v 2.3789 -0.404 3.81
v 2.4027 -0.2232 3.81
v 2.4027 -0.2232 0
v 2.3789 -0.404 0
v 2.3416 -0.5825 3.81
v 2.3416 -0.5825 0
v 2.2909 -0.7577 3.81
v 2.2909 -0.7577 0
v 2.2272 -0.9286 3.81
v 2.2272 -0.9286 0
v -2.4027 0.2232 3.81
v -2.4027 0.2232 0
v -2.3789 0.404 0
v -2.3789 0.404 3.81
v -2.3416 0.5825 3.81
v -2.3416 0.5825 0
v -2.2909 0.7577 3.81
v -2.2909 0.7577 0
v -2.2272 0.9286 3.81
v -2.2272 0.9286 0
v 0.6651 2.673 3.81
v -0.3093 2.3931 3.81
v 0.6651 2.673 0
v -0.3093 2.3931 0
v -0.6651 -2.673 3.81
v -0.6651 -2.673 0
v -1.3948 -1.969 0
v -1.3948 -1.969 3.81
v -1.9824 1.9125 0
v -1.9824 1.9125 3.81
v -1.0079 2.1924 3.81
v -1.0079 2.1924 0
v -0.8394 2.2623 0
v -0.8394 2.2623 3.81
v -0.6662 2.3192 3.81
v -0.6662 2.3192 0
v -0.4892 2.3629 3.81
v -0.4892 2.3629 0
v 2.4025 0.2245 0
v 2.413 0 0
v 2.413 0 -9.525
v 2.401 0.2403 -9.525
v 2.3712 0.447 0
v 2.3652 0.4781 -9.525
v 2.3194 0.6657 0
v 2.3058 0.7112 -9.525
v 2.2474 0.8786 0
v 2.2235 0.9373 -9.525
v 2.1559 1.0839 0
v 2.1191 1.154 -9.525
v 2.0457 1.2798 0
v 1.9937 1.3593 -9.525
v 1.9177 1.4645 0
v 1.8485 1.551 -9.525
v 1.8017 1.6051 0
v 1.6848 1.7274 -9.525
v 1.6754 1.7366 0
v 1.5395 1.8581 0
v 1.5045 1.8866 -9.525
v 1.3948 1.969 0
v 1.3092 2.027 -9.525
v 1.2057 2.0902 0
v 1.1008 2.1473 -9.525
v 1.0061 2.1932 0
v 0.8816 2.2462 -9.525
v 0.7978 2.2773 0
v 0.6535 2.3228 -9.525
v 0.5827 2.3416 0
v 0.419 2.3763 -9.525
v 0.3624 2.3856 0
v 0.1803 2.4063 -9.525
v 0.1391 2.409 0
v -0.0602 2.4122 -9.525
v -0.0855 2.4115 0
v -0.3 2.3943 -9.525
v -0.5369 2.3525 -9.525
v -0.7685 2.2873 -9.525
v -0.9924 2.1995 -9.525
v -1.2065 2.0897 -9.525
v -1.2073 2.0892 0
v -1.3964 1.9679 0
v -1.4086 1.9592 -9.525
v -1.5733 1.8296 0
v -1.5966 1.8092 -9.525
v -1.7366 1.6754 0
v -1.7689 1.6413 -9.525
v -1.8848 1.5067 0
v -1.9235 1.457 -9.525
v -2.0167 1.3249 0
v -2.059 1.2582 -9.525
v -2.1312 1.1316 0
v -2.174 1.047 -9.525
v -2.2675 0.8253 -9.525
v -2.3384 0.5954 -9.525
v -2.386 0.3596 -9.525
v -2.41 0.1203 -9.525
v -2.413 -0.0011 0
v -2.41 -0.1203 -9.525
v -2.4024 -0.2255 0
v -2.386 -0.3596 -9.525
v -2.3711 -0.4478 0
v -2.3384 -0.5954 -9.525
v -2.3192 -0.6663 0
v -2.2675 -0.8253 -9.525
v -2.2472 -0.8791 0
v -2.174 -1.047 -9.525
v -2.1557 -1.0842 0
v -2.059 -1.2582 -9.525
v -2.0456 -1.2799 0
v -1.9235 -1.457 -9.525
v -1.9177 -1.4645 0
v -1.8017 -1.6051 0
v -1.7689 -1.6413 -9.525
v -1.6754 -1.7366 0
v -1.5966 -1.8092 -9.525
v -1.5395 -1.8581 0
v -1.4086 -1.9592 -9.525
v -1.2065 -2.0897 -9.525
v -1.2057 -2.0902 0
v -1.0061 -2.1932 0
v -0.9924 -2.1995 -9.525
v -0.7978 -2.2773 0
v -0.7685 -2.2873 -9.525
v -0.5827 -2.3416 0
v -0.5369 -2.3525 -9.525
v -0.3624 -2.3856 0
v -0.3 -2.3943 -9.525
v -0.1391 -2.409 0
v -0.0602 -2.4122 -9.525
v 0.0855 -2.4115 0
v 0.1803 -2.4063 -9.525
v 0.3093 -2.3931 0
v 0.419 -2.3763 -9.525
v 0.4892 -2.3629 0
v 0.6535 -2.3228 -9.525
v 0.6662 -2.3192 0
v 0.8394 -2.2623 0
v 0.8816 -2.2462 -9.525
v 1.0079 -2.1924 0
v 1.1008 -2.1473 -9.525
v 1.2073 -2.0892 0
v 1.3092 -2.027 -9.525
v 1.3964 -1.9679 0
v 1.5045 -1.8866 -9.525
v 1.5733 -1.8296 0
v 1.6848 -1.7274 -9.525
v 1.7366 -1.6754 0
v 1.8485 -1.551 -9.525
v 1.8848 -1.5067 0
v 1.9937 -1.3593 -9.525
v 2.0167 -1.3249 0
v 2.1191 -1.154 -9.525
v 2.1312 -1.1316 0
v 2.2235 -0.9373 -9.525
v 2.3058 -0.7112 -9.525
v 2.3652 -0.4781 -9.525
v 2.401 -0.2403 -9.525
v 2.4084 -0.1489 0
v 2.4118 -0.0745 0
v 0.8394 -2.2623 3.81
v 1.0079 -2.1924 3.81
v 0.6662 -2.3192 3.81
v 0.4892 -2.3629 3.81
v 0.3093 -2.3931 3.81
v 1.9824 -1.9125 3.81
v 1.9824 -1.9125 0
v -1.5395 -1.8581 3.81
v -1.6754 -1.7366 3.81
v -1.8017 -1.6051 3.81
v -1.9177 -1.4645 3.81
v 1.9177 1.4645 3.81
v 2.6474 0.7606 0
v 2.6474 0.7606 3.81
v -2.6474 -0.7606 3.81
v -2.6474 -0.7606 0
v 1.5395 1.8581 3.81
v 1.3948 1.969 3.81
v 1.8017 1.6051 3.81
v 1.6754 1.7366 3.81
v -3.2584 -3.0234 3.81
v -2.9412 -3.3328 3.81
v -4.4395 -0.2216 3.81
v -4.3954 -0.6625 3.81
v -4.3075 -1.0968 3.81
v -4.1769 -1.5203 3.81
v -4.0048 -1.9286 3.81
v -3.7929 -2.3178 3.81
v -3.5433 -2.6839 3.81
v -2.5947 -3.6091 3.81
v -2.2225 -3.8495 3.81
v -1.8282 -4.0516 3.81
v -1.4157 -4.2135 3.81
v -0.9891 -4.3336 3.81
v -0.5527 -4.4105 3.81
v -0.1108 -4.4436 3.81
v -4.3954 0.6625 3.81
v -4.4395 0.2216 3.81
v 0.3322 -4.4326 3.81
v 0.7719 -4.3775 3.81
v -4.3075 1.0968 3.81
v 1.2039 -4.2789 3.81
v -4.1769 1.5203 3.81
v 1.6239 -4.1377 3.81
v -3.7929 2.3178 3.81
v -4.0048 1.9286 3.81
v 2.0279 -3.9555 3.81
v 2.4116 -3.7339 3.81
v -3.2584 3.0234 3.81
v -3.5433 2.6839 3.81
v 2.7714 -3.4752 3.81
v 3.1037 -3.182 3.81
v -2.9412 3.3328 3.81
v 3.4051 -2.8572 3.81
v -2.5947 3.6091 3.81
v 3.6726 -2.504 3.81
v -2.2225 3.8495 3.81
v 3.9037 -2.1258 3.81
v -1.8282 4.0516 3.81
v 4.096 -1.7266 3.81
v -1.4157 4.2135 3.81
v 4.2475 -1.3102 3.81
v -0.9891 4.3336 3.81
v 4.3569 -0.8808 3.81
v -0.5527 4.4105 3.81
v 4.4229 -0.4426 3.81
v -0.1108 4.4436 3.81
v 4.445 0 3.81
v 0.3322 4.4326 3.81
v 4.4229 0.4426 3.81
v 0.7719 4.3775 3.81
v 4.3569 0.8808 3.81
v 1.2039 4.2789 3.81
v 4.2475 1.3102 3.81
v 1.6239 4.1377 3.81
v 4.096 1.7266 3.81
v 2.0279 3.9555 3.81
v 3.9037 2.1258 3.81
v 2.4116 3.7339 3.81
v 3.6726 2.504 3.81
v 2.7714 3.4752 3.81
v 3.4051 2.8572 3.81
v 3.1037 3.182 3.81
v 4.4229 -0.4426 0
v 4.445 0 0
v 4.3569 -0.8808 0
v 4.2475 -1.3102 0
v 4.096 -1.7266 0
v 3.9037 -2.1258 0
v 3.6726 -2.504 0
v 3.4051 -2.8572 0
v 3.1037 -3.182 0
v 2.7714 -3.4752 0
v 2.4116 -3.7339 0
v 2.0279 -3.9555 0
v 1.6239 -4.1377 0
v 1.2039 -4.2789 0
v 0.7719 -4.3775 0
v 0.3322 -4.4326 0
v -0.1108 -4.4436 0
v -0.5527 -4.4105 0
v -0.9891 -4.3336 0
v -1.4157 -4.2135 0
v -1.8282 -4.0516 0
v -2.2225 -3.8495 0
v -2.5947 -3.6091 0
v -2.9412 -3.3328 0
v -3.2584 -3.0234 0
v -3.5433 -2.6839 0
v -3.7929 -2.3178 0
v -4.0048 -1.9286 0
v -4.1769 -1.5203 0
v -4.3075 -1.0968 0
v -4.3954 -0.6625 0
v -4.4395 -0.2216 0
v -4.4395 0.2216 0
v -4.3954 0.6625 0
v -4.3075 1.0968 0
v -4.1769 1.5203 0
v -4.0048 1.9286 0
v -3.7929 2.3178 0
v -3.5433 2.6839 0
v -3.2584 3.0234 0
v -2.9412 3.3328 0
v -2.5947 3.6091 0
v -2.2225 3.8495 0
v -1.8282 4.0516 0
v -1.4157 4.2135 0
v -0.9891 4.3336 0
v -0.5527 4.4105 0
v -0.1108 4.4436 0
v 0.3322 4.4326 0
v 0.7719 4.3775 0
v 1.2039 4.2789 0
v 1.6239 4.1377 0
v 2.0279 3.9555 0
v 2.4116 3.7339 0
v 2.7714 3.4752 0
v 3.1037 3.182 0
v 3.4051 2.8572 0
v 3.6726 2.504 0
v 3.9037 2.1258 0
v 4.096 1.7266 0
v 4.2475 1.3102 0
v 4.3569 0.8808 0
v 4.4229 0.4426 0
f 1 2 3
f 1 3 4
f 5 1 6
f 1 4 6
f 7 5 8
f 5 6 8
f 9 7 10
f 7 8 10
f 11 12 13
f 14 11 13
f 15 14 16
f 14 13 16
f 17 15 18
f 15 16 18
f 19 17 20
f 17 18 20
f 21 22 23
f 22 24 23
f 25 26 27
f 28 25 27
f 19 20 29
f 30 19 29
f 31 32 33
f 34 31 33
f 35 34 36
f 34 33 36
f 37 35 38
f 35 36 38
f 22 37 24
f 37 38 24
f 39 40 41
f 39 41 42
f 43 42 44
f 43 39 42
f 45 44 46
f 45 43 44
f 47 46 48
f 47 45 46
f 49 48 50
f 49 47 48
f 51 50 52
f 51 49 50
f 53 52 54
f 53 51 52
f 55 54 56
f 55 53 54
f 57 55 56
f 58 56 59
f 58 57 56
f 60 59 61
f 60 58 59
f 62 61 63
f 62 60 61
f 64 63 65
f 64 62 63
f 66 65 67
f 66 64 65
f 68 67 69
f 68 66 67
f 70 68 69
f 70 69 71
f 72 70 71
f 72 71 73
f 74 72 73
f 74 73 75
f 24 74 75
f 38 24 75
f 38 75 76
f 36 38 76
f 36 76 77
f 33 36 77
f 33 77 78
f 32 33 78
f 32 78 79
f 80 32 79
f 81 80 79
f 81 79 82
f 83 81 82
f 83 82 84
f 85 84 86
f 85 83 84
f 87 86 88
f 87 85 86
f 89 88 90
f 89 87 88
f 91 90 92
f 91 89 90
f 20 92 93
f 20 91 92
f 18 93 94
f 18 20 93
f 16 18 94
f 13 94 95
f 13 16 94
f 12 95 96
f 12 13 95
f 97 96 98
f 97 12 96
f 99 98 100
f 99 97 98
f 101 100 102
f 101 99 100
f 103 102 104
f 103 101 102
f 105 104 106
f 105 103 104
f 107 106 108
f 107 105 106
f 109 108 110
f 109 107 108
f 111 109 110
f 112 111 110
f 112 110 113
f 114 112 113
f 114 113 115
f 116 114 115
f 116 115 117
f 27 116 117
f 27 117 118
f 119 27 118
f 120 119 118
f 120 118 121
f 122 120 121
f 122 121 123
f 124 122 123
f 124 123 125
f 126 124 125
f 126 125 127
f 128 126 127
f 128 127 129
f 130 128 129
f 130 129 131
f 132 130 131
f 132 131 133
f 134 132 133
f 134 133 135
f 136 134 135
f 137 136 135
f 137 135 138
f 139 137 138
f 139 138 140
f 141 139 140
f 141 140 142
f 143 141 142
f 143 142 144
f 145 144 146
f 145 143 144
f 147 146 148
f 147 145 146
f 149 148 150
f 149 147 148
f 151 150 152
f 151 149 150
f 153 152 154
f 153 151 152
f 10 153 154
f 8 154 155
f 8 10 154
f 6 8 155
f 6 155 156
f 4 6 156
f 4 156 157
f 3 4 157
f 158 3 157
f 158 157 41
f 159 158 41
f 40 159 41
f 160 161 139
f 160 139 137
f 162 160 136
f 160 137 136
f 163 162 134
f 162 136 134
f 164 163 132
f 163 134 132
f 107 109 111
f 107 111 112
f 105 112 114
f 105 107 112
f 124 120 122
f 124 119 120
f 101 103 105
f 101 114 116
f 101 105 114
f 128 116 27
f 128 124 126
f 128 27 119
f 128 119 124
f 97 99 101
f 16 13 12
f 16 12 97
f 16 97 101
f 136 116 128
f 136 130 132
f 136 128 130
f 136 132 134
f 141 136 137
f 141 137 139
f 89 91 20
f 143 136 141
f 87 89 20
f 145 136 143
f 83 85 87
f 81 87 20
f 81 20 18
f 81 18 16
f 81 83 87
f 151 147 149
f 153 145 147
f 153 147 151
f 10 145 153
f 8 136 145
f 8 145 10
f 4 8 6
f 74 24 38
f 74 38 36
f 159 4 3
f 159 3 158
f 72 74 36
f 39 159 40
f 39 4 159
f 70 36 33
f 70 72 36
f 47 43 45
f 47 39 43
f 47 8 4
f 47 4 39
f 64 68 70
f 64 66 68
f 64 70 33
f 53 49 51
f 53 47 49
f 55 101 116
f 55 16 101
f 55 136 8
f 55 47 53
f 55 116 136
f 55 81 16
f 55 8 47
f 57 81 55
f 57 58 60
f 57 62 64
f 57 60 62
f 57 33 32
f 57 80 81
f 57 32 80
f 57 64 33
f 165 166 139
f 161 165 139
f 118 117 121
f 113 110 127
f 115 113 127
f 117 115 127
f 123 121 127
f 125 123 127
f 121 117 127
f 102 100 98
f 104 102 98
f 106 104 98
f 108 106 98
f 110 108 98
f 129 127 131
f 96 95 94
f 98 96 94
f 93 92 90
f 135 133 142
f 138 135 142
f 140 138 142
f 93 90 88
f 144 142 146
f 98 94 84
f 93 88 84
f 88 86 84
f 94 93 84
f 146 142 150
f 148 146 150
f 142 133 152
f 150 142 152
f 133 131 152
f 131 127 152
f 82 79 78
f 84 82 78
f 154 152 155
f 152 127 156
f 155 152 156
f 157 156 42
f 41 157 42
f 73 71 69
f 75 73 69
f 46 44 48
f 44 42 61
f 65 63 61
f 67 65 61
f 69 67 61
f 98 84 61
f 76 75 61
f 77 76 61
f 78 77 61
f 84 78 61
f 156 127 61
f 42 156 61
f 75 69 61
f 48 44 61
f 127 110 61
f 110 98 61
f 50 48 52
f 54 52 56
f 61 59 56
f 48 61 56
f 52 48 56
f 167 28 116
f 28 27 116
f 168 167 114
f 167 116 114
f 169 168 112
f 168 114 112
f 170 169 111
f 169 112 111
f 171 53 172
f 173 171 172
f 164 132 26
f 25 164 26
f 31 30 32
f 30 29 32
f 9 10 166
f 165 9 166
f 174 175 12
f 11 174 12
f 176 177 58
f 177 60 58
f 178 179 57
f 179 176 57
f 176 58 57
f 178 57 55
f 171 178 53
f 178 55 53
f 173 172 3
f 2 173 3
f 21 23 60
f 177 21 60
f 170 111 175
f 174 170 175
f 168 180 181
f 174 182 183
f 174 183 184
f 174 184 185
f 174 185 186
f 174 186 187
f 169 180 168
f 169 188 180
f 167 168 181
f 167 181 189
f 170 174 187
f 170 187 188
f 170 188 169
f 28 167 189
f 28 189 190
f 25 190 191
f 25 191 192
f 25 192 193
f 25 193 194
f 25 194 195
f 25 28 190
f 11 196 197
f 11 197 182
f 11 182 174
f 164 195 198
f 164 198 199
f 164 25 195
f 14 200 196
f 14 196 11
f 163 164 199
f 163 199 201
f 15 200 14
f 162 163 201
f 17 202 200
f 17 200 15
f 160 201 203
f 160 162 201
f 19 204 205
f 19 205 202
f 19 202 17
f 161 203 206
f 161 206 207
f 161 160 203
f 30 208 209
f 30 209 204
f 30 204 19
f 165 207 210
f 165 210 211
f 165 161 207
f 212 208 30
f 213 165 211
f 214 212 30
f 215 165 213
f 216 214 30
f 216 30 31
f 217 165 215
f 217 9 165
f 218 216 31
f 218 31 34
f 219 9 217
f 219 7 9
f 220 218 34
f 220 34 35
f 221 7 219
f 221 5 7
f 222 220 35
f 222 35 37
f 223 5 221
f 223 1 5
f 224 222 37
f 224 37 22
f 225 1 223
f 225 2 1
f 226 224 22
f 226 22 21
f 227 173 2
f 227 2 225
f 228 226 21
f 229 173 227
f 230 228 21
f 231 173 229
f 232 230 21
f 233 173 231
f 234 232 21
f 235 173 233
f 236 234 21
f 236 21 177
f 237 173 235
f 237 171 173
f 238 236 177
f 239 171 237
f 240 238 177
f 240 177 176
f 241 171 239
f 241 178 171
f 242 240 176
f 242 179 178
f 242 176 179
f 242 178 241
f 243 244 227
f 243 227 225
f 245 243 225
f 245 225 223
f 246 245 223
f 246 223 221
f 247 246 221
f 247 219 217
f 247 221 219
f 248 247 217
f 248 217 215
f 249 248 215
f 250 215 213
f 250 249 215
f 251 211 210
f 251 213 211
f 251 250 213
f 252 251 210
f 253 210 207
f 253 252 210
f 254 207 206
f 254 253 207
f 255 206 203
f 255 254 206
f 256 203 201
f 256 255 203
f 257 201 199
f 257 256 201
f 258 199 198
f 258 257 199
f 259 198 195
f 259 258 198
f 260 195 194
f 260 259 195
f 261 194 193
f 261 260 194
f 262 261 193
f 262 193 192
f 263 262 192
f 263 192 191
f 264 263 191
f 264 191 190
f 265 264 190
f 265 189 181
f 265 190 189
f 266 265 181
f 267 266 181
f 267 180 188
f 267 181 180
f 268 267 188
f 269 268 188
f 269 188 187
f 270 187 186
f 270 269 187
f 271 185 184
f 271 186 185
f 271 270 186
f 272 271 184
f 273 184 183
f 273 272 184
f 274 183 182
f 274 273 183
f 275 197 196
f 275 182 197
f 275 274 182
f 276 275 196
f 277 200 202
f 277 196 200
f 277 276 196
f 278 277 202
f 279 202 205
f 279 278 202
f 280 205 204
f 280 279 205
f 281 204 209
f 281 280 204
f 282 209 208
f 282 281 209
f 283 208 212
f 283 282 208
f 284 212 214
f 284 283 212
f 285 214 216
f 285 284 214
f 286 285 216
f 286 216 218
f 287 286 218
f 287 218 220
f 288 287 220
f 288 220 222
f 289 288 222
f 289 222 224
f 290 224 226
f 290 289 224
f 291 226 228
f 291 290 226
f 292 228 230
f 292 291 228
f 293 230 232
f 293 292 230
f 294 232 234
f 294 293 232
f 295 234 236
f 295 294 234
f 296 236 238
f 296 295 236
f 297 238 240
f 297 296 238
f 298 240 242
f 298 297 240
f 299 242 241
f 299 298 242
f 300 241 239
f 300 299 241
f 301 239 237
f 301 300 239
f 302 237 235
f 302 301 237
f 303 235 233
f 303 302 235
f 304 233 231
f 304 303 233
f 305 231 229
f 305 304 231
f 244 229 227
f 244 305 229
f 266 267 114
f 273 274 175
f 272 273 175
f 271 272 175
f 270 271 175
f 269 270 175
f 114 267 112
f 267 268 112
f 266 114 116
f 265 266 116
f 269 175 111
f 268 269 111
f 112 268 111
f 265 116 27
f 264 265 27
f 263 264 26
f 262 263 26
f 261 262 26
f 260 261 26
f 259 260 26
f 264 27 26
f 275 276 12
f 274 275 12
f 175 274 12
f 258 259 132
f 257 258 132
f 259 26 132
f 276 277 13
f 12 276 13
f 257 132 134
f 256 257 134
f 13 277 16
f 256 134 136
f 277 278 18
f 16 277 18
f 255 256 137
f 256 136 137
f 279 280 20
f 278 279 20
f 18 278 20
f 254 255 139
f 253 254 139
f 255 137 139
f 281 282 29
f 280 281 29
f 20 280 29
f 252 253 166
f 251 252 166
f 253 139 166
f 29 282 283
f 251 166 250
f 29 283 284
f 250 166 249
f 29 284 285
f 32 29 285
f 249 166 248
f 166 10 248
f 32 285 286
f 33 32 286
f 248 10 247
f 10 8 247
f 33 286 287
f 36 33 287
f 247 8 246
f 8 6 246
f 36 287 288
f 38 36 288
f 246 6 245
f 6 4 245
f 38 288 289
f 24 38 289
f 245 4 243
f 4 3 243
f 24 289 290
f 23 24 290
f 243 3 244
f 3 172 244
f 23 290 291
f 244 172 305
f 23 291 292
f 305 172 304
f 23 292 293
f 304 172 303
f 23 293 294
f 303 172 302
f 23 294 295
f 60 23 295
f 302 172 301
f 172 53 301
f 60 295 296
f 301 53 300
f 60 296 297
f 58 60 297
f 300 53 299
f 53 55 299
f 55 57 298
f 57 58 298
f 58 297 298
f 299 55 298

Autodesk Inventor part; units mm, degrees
ref_plane "YZ Plane" through (0, 0, 0) normal (1, 0, 0) x (0, 1, 0)
ref_plane "XZ Plane" through (0, 0, 0) normal (0, 1, 0) x (-1, 0, 0)
ref_plane "XY Plane" through (0, 0, 0) normal (0, 0, 1) x (1, 0, 0)
sketch "Sketch1" plane through (0, 0, 0) normal (0, 0, 1) x (1, 0, 0)
  circle A0 centre (0, 0) radius 4.445
  circle A1 centre (0, 0) radius 2.413
  line L0 (0.6651, 2.673) -> (2.6474, 0.7606)
  line L1 (2.6474, 0.7606) -> (1.9824, -1.9125)
  line L2 (1.9824, -1.9125) -> (-0.6651, -2.673)
  line L3 (-0.6651, -2.673) -> (-2.6474, -0.7606)
  line L4 (-2.6474, -0.7606) -> (-1.9824, 1.9125)
  line L5 (-1.9824, 1.9125) -> (0.6651, 2.673)
  dimension "d0" = 4.826
  dimension "d1" = 8.89
extrude "Extrusion1" add sketch "Sketch1" against normal blind 9.525 contours A1 L1 L2 L3 L4 L5 L0 | L0 A1 | A1 L1 | L5 A1 | A1 L2 | L4 A1 | A1 L3
extrude "Extrusion2" add sketch "Sketch1" along normal blind 3.81
thread "Thread1" size "10-32 UNF" class "2A" standard "ANSI Unified Screw Threads" full length
properties part number "Borl BD Drill motor mount"
